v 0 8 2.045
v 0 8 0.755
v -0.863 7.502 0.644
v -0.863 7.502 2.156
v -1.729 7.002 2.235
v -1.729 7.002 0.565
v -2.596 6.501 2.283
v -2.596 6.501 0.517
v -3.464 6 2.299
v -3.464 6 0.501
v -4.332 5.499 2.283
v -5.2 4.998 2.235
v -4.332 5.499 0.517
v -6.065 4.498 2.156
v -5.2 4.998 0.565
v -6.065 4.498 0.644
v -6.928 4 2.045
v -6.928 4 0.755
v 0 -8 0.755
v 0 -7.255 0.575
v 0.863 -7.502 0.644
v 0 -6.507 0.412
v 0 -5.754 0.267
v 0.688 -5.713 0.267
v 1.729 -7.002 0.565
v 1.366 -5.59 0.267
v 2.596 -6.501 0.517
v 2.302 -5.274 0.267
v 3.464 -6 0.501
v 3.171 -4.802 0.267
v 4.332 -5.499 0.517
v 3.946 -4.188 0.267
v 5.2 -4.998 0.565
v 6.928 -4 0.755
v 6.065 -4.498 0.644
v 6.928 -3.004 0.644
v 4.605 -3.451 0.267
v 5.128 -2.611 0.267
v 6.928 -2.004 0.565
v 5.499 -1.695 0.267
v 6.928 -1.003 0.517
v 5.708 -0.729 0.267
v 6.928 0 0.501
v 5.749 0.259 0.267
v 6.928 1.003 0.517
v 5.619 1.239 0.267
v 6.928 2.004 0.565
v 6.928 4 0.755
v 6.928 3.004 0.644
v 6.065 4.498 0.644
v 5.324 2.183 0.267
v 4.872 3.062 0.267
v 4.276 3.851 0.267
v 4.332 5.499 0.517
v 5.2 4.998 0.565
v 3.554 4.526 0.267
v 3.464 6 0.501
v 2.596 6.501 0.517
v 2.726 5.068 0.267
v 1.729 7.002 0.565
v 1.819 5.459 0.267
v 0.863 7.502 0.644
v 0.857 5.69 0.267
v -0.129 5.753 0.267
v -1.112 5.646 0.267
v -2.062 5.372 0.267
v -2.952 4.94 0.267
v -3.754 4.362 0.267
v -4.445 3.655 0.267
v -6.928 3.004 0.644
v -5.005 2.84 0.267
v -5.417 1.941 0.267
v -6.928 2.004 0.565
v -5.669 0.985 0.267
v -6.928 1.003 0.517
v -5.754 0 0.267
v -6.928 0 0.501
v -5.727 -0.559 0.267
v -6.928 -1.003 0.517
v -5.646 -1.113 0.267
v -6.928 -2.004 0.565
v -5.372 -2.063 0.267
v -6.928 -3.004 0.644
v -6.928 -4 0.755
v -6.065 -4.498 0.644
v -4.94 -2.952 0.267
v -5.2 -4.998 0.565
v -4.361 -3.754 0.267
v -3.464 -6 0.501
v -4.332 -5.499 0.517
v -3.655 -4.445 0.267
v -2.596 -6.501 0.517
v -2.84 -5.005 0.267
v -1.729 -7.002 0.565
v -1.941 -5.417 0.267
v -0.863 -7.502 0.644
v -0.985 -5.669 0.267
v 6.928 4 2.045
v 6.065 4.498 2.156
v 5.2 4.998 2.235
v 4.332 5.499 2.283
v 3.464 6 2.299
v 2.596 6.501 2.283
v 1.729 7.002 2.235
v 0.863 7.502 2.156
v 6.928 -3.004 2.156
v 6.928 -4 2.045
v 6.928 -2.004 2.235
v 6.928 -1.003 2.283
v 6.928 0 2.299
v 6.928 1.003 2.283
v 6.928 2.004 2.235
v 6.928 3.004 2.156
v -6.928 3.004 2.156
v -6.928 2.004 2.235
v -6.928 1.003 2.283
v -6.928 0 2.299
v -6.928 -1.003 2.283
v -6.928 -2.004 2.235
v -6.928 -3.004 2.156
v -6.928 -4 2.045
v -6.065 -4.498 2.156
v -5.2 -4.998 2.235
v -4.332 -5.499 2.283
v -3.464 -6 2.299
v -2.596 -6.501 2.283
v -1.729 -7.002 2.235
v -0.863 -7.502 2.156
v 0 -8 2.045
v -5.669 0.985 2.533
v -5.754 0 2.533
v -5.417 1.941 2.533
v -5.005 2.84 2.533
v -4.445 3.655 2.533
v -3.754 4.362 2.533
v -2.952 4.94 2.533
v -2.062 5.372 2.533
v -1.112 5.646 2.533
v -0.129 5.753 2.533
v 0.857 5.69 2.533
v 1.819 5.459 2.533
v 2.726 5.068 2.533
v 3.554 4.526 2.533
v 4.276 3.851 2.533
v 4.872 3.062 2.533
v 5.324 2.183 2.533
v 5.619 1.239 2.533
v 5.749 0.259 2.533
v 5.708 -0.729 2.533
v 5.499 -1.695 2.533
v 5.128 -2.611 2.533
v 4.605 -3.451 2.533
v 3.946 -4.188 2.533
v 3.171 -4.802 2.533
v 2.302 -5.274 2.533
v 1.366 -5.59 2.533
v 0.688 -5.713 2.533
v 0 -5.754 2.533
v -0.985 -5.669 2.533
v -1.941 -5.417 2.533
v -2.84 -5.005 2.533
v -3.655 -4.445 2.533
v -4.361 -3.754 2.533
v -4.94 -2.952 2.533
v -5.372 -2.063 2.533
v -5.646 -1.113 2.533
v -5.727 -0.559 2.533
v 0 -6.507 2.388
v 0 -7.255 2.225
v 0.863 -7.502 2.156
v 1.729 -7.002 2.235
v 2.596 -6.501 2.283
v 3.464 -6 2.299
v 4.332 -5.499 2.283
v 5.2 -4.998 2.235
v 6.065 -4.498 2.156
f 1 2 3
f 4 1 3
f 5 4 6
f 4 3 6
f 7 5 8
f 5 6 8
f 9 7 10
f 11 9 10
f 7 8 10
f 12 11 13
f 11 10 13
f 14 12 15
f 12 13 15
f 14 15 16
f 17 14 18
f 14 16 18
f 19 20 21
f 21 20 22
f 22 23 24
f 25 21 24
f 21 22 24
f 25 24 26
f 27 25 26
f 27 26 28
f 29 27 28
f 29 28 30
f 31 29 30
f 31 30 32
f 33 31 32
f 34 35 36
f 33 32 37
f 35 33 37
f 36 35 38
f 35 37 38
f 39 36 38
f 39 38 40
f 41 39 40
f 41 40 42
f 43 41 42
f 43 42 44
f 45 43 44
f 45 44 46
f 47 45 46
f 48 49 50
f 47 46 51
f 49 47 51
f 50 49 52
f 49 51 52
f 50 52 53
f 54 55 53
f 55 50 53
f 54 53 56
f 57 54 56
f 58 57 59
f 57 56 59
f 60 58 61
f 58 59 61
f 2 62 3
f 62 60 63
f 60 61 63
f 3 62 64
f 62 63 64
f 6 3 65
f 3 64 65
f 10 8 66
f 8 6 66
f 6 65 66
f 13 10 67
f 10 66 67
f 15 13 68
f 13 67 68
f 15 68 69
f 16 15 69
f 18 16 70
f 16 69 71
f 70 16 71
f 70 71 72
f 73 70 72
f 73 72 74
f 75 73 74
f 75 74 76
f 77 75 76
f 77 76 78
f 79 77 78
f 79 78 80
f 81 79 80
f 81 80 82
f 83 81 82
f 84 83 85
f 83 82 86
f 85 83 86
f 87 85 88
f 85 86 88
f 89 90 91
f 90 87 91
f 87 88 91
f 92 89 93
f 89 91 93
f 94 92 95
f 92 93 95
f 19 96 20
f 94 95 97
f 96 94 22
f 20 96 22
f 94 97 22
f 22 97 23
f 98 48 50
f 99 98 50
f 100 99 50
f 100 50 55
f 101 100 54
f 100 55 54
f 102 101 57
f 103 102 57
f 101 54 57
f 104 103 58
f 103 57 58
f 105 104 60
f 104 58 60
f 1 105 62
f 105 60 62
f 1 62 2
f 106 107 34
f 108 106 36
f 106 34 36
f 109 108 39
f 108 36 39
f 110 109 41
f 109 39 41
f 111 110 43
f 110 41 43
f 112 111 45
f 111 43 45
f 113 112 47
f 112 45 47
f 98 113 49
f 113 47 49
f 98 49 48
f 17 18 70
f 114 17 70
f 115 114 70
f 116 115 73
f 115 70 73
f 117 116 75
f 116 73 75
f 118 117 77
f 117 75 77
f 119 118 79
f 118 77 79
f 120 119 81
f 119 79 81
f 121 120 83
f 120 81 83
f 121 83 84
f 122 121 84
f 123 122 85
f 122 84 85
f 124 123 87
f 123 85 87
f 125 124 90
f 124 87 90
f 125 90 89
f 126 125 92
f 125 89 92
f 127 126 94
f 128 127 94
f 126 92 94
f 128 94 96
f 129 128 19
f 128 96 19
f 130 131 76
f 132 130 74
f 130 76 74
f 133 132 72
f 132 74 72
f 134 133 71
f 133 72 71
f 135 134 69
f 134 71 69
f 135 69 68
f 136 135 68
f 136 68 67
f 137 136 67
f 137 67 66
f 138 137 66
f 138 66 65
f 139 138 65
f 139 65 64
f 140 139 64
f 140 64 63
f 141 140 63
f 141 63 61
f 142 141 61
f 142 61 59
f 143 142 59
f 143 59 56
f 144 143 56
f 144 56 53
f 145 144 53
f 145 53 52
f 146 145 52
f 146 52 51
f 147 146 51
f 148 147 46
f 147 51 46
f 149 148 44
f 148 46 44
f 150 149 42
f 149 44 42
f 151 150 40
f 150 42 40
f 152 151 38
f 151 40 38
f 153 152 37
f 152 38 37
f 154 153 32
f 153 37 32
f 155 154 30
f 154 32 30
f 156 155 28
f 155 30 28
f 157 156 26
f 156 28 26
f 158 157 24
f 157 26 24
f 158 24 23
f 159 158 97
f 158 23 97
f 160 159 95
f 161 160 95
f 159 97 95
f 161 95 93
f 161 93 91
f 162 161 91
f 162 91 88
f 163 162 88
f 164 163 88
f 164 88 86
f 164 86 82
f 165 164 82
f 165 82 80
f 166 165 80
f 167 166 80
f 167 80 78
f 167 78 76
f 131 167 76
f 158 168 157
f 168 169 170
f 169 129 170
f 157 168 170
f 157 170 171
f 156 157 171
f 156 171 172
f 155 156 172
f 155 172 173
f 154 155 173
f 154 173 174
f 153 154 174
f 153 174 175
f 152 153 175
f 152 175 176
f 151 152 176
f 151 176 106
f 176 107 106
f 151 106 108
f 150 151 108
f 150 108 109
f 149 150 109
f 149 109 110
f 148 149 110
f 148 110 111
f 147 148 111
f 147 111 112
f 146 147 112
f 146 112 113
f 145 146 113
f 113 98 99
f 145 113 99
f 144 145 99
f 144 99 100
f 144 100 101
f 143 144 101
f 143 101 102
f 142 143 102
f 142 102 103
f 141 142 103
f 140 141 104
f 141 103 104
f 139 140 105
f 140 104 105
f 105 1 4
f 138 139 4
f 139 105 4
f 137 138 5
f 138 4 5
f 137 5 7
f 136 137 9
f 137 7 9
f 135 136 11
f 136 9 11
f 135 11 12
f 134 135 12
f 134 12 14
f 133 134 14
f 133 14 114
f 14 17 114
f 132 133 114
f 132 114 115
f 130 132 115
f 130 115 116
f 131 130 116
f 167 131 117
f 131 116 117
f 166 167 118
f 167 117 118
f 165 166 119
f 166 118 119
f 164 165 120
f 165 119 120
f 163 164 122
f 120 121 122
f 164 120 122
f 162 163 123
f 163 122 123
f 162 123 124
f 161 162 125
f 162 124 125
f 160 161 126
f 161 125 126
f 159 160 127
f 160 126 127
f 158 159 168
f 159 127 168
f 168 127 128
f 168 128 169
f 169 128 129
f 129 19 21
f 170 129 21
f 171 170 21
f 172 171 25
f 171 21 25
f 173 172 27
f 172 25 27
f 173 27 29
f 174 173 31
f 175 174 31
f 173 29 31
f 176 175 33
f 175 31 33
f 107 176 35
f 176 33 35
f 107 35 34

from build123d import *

# Parameters (mm, degrees)
BOSS_EXTRUDE1_DEPTH     = 2.8
F_1_2_20_TAPPED_HOLE1_D = 11.50874


with BuildPart() as part:
    # Sketch1 → Boss-Extrude1 (new body)
    with BuildSketch(Plane.XY):
        Polygon((0, 8), (-6.92820323, 4), (-6.92820323, -4), (0, -8), (6.92820323, -4), (6.92820323, 4), align=None)
    extrude(amount=BOSS_EXTRUDE1_DEPTH)

    # 1/2-20 Tapped Hole1 (through all)
    with Locations(Plane.XY.offset(2.8)):
        with Locations((0, 0)):
            Hole(F_1_2_20_TAPPED_HOLE1_D / 2)

    # Sketch6 → Cut-Revolve4 (revolve, cut)
    with BuildSketch(Plane(origin=(0, 0, 0), x_dir=(0, 0, -1), z_dir=(1, 0, 0))):
        with BuildLine():
            Line((-3.556750554, -8.169183417), (-3.141854791, -1.510155907))
            Line((-3.141854791, -1.510155907), (-3.012564121, -1.510155907))
            ThreePointArc((-3.012564121, -1.510155907), (-2.693421742, -4.779625328), (-2.04498583, -8))
            ThreePointArc((-2.04498583, -8), (-2.70372151, -8.952660986), (-3.556750554, -8.169183417))
        make_face()
        with BuildLine():
            Line((0.212564121, -1.510155907), (0.341854791, -1.510155907))
            Line((0.341854791, -1.510155907), (0.756750554, -8.169183417))
            ThreePointArc((0.756750554, -8.169183417), (-0.09627849, -8.952660986), (-0.75501417, -8))
            ThreePointArc((-0.75501417, -8), (-0.106578258, -4.779625328), (0.212564121, -1.510155907))
        make_face()
    revolve(axis=Axis((0, 0, 0), (0, 0, 1)), mode=Mode.SUBTRACT)


solid = part.part
